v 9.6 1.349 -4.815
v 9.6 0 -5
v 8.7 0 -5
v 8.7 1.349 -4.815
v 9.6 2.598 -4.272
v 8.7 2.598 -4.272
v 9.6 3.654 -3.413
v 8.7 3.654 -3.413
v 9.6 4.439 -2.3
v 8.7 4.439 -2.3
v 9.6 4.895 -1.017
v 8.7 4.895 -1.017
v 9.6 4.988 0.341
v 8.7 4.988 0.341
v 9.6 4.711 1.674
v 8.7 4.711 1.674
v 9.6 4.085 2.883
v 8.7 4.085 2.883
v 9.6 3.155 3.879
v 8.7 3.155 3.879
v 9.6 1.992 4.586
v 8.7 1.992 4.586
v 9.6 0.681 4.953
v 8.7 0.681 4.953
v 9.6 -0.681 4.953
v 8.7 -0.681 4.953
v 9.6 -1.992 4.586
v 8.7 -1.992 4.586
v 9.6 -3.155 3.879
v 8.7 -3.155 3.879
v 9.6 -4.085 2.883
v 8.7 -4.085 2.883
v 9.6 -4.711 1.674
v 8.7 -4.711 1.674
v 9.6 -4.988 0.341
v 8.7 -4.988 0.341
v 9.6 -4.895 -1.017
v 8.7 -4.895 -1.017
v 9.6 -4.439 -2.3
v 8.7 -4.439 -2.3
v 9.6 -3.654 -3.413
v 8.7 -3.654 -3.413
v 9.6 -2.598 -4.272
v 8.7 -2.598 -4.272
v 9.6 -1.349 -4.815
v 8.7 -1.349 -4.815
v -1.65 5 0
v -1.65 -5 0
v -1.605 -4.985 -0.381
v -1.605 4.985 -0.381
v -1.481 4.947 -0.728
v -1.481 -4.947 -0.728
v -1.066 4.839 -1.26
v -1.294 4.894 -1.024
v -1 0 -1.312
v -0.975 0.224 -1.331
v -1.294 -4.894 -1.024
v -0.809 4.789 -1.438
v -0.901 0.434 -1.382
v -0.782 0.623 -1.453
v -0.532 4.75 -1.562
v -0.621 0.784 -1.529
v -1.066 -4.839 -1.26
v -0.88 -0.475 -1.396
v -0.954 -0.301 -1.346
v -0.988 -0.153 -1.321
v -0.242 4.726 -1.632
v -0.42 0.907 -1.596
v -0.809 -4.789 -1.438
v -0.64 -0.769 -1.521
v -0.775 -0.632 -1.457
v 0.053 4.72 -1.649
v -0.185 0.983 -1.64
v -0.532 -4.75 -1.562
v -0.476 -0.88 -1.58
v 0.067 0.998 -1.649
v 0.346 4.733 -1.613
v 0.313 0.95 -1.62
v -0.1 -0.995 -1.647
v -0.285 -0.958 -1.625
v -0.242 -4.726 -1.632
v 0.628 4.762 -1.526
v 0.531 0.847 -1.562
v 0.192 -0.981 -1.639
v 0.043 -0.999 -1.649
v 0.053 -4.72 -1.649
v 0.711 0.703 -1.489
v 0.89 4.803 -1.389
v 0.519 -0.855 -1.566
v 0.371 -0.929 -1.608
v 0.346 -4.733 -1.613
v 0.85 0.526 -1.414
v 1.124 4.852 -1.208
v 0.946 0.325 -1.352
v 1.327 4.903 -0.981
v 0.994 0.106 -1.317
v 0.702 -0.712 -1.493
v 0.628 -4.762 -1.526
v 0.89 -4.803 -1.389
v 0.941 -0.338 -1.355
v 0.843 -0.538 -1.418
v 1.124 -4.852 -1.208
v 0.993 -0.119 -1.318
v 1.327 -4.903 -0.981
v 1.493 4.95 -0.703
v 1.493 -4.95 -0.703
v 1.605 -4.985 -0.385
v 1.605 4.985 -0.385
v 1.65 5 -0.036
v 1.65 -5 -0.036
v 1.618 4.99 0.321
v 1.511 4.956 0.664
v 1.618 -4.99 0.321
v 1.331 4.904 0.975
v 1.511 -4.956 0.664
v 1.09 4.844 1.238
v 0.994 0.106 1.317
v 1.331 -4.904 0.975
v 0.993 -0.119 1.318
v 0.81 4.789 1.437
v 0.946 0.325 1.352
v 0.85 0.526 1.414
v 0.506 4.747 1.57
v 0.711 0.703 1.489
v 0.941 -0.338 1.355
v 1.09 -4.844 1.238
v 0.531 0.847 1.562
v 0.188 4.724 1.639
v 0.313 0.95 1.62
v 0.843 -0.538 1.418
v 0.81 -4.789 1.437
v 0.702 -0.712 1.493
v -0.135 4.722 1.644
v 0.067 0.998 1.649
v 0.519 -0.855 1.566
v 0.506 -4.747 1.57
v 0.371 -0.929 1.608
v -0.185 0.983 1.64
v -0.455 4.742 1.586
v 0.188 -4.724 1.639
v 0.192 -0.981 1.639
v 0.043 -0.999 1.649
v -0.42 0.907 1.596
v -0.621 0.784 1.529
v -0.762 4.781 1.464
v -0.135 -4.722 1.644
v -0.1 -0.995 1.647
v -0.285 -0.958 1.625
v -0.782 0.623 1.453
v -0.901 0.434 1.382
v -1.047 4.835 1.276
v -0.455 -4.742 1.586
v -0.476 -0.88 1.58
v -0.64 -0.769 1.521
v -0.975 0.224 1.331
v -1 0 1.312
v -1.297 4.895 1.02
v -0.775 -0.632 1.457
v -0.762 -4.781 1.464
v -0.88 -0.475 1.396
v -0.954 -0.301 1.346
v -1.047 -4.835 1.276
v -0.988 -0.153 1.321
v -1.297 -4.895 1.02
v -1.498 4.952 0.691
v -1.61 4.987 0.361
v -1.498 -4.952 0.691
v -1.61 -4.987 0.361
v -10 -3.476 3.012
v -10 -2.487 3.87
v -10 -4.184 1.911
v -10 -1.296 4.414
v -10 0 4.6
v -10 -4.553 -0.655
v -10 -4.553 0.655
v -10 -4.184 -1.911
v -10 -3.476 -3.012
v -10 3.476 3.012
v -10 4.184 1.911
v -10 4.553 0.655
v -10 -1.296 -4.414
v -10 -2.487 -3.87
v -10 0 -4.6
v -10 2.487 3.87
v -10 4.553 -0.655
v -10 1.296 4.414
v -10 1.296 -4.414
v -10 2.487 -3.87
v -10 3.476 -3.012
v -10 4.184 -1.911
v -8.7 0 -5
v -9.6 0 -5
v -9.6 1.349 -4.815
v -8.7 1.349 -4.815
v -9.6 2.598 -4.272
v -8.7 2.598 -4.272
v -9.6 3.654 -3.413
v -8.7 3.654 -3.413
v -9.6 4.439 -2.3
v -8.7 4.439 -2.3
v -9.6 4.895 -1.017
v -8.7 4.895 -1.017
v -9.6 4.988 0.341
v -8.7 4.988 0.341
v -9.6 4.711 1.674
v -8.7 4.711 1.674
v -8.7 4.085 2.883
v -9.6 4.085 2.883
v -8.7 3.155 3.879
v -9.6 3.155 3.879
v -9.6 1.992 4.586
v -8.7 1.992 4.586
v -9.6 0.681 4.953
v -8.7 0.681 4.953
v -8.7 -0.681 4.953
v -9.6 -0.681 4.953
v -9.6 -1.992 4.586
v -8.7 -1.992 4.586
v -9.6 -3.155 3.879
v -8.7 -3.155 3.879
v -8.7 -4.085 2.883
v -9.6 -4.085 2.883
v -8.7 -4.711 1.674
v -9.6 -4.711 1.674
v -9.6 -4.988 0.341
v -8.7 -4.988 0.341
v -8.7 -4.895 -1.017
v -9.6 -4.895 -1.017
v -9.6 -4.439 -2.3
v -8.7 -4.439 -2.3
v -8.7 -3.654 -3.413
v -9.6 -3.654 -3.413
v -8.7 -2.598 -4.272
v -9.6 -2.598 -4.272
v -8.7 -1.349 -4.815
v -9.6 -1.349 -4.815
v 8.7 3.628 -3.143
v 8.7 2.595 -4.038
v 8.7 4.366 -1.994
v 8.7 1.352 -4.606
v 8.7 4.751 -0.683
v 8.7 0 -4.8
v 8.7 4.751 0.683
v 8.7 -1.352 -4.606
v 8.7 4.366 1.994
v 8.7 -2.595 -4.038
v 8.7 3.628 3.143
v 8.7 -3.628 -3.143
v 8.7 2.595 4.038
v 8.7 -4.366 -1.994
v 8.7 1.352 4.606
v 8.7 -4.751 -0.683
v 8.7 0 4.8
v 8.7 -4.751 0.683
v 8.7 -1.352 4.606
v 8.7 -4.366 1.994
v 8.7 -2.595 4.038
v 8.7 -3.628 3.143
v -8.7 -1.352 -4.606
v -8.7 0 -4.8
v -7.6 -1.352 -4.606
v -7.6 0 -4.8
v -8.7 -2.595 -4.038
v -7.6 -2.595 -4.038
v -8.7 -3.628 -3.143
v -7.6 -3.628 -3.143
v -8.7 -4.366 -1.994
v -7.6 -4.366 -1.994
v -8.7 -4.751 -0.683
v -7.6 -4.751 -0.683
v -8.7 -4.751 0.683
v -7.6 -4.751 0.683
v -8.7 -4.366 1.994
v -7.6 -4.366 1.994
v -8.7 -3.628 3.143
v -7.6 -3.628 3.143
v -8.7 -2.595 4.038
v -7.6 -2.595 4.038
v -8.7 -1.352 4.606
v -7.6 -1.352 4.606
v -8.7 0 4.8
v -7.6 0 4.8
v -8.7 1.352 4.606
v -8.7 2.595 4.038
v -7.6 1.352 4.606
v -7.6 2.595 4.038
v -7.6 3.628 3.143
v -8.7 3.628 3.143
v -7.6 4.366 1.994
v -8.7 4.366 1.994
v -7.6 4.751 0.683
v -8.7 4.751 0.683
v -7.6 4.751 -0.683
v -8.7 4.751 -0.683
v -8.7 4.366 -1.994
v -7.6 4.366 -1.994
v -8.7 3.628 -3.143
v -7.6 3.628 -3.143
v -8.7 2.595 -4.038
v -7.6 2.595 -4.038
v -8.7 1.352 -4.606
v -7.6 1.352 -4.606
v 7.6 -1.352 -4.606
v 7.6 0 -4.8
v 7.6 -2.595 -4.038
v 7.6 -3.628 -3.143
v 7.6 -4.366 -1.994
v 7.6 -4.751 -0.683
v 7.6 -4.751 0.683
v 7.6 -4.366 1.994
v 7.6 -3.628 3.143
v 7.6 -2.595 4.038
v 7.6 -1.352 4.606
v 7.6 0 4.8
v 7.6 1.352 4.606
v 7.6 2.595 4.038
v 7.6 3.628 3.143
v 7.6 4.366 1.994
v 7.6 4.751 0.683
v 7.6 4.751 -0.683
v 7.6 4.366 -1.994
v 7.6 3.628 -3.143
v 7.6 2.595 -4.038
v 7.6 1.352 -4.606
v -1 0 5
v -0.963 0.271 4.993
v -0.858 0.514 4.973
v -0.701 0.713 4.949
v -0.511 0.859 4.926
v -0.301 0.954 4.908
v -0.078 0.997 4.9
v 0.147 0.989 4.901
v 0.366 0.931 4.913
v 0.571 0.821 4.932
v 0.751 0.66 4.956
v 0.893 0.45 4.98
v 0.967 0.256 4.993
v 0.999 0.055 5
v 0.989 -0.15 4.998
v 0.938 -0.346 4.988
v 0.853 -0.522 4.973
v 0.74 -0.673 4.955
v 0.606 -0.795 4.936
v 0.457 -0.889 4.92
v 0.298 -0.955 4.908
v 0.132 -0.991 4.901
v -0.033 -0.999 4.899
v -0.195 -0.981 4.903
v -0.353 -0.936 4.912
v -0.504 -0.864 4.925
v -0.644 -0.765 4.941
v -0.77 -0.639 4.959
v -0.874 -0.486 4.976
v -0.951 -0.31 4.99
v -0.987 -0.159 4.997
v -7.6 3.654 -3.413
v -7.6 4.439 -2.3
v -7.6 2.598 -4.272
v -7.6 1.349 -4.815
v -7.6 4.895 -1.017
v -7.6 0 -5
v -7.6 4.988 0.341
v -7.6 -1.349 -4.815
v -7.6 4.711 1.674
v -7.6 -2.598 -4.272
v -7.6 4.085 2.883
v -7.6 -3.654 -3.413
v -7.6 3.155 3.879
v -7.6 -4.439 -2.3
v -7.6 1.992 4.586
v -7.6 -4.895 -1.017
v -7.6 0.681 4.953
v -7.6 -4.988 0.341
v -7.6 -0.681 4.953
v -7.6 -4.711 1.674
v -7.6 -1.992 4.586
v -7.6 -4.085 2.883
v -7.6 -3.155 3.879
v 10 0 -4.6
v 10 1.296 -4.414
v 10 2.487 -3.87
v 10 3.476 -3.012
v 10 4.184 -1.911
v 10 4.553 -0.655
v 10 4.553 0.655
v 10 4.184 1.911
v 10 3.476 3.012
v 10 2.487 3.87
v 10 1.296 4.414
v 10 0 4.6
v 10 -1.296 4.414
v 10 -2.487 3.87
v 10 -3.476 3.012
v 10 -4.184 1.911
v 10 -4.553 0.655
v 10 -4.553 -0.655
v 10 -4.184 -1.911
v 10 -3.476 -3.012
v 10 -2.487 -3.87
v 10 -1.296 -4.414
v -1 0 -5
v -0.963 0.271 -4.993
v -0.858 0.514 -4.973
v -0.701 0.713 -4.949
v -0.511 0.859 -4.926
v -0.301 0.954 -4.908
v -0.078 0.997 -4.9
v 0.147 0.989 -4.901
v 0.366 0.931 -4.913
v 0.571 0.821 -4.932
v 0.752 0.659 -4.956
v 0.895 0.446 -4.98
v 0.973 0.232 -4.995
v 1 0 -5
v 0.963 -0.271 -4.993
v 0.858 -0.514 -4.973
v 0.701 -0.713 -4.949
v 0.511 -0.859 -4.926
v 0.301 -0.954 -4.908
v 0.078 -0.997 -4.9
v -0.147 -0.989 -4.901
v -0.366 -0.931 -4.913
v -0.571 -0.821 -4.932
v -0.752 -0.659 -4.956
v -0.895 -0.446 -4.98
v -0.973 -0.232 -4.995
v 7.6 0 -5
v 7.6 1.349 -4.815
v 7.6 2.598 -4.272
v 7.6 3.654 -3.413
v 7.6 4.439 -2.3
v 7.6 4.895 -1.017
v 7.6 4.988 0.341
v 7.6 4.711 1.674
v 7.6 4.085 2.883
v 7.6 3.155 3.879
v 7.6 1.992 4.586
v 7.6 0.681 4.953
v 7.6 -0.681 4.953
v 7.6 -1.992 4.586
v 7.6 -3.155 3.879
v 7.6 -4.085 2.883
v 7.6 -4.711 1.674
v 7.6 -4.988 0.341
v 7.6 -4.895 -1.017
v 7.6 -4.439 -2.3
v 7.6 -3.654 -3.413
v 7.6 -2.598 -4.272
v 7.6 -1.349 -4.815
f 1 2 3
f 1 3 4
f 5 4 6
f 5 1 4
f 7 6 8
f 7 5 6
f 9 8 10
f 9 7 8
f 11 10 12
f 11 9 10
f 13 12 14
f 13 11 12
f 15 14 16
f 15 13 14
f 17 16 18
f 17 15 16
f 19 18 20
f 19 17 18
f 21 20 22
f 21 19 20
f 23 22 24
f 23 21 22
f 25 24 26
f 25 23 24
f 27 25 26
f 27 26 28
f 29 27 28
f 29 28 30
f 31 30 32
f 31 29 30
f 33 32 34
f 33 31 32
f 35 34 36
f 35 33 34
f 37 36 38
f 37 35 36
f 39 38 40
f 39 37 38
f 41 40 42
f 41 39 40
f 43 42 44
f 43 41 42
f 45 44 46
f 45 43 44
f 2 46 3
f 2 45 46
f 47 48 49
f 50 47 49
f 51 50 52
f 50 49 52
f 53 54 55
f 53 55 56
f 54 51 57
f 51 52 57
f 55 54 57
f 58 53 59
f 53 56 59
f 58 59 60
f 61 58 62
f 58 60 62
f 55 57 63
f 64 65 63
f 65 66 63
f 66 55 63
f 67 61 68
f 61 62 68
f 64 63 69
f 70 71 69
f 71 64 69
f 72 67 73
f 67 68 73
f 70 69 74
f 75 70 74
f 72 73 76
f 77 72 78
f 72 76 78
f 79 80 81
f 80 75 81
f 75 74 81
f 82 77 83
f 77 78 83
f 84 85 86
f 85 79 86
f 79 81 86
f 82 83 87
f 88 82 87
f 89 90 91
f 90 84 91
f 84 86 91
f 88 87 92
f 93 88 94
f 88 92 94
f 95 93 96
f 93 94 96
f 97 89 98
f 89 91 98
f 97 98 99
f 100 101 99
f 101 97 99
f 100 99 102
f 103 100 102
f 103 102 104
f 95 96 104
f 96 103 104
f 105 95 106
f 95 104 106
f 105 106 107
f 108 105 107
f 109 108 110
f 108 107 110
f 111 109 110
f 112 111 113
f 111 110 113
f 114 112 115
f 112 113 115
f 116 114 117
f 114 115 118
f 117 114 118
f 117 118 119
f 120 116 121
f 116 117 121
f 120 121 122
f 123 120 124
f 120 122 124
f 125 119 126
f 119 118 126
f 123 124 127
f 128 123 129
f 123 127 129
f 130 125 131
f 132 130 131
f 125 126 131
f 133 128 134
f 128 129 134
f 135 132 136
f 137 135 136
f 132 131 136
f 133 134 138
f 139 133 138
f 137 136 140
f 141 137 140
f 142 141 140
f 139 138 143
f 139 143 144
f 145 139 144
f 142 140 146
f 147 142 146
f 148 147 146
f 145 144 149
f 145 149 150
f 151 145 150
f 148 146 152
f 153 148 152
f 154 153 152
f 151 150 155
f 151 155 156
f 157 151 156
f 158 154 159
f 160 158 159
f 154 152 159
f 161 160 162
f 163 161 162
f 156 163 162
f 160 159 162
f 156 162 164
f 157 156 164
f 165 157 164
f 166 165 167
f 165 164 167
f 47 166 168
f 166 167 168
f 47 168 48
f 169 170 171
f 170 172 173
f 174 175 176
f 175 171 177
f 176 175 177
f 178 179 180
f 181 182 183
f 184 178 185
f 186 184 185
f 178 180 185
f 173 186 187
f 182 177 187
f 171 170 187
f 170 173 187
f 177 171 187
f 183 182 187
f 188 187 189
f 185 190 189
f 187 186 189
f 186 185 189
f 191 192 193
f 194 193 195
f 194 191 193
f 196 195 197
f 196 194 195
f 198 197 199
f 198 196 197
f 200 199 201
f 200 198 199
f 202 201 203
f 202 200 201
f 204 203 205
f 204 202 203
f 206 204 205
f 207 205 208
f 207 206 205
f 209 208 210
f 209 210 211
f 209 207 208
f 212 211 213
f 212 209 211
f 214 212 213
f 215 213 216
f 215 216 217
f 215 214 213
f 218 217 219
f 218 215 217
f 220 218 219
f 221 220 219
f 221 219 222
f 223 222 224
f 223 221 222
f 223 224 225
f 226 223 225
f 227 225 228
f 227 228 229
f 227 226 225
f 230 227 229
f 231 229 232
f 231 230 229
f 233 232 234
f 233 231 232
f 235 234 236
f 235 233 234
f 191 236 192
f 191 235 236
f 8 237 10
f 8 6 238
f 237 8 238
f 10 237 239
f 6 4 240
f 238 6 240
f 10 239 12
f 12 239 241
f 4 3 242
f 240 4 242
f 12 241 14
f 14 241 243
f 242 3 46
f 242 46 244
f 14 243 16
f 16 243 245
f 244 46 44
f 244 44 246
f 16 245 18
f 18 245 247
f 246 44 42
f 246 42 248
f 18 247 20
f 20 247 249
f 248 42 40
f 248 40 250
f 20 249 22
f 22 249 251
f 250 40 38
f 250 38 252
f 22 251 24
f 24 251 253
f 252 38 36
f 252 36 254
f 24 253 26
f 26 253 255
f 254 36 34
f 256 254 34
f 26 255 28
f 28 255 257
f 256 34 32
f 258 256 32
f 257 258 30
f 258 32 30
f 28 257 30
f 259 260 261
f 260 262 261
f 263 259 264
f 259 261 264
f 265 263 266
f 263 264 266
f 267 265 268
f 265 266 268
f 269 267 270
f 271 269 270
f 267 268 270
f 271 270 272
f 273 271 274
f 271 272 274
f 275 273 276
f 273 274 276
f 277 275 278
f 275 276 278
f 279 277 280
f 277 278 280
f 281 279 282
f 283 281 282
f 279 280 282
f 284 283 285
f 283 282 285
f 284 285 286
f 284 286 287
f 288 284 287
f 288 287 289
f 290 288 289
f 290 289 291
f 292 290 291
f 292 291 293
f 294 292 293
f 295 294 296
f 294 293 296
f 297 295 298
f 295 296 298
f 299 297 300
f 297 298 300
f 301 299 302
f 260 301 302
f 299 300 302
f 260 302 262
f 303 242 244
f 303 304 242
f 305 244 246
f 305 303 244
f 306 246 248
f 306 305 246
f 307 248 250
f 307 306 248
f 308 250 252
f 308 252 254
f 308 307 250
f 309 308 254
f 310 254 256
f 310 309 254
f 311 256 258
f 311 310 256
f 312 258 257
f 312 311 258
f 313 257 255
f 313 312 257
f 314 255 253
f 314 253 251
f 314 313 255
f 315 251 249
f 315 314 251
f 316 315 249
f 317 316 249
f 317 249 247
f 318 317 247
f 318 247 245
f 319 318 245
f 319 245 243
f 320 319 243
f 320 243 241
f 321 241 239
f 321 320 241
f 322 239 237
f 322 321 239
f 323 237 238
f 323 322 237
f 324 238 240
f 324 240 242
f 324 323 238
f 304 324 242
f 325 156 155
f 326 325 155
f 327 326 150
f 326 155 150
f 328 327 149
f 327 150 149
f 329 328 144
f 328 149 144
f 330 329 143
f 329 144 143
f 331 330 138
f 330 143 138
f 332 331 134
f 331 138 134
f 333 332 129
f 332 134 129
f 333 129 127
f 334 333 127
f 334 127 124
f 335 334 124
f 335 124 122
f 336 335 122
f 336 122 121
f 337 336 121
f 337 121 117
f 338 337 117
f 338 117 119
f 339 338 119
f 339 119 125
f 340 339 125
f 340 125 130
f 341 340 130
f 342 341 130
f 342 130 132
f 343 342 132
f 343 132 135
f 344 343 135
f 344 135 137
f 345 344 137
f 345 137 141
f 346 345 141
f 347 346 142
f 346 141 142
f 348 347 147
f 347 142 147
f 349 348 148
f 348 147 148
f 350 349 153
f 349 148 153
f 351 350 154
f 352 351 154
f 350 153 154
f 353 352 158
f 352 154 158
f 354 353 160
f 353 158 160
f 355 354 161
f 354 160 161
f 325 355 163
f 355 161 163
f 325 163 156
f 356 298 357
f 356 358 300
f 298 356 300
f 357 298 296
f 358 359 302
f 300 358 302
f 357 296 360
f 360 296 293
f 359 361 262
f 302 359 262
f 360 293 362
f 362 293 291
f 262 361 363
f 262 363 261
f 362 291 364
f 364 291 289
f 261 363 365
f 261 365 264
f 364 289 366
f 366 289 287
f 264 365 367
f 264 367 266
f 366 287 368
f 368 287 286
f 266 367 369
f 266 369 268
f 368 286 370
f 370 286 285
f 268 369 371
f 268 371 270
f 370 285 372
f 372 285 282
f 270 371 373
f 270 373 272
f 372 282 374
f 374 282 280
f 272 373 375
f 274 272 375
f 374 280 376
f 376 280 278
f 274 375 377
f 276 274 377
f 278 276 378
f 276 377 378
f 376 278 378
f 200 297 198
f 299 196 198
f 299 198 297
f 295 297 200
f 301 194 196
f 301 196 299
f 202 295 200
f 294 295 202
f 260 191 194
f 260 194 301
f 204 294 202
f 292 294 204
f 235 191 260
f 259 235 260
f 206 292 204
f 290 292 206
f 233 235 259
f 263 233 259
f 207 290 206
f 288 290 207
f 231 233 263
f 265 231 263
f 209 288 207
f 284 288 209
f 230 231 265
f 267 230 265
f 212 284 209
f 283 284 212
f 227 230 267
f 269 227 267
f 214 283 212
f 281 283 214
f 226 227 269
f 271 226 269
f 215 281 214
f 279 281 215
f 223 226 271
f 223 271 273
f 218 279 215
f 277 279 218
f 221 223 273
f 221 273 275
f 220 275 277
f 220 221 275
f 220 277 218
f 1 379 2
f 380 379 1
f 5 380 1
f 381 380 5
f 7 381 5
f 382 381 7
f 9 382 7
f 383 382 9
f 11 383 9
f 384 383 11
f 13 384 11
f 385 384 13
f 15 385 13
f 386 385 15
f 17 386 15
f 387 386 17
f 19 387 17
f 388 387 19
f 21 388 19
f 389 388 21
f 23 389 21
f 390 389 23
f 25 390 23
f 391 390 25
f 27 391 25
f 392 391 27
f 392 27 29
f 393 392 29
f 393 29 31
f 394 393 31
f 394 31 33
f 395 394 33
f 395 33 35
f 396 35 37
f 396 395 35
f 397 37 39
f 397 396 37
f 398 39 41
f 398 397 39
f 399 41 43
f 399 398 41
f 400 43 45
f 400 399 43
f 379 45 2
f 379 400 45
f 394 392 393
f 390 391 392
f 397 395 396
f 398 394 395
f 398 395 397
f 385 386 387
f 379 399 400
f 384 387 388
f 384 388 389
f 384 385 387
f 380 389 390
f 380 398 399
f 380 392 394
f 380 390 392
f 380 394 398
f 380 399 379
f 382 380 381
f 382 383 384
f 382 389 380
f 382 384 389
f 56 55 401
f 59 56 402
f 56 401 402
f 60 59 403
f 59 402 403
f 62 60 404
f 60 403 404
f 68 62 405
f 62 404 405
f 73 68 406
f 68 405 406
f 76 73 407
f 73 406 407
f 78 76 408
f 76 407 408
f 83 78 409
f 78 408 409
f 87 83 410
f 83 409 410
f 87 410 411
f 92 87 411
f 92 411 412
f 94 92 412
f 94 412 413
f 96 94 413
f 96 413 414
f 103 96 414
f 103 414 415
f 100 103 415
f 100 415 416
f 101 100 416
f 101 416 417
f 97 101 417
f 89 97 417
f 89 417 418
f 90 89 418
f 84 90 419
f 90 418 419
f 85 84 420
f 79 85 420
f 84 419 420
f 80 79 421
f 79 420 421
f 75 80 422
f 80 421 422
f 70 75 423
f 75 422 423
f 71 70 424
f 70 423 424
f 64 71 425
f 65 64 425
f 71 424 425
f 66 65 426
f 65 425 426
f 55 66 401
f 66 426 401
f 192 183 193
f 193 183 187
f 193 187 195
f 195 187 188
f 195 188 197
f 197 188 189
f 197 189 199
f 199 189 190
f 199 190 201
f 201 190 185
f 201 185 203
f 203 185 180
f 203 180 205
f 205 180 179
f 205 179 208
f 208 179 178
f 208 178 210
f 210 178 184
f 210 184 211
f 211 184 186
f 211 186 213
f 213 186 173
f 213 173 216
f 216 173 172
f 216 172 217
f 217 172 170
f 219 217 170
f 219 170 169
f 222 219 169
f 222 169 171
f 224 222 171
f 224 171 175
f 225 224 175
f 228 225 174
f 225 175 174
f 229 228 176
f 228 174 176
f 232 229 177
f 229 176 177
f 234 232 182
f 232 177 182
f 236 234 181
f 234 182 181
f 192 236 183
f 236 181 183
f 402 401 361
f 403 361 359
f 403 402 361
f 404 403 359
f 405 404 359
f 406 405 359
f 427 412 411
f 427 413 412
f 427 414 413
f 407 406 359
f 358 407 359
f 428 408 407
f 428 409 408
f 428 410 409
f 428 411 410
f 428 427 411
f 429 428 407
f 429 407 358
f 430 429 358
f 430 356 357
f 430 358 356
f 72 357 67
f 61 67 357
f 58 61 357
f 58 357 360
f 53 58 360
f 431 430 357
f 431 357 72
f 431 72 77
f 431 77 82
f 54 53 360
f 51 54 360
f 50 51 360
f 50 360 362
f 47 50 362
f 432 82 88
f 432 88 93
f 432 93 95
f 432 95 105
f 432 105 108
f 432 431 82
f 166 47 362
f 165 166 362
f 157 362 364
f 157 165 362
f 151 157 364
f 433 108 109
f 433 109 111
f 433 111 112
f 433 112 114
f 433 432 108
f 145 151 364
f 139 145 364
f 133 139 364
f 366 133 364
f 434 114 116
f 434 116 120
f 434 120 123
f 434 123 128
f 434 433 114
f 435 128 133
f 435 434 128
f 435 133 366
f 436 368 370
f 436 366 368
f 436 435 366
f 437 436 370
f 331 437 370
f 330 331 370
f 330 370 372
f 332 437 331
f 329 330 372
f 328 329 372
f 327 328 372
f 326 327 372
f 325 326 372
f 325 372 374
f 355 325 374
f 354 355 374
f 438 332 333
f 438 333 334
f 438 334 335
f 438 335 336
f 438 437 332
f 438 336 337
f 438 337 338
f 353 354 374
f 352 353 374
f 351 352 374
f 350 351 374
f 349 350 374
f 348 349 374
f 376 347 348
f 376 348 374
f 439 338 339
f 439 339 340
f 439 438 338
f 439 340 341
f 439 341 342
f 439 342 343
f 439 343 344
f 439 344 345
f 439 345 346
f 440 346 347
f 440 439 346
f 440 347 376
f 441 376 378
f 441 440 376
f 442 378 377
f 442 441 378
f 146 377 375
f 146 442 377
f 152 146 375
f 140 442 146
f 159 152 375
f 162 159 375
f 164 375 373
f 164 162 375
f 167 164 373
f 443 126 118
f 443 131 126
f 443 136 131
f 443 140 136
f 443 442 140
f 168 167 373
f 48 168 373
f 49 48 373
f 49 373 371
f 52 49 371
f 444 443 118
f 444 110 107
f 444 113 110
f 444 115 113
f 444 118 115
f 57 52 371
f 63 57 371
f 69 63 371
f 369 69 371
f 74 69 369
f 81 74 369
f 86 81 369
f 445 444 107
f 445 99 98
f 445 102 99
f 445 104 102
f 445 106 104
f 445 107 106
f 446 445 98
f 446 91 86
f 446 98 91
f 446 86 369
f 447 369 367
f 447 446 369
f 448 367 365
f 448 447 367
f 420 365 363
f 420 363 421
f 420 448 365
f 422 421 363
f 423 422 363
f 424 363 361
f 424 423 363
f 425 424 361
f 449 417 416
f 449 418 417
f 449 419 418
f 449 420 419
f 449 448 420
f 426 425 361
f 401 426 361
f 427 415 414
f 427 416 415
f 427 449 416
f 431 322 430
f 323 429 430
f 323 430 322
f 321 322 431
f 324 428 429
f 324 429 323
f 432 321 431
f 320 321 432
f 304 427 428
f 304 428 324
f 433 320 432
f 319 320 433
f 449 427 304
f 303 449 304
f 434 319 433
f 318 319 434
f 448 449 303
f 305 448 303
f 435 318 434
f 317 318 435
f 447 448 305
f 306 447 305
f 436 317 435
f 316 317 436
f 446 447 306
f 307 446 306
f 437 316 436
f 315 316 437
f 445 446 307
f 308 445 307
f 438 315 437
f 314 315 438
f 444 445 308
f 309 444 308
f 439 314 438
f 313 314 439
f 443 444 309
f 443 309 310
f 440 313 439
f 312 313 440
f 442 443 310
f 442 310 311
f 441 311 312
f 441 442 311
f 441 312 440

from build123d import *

# Parameters (mm, degrees)
SKETCH1_R           = 5
BOSS_EXTRUDE1_DEPTH = 10
SKETCH2_W           = 1.1
SKETCH2_H           = 0.2
CHAMFER1_SIZE       = 0.4
M4_TAPPED_HOLE4_D   = 3.3
SKETCH6_R           = 1
CUT_EXTRUDE1_DEPTH  = 16.0000001


with BuildPart() as part:
    # Sketch1 → Boss-Extrude1 (new, symmetric)
    with BuildSketch(Plane(origin=(0, 0, 0), x_dir=(0, 0, -1), z_dir=(1, 0, 0))):
        Circle(SKETCH1_R)
    extrude(amount=BOSS_EXTRUDE1_DEPTH, both=True)

    # Sketch2 → Cut-Revolve1 (revolve, cut)
    with BuildSketch(Plane(origin=(0, 0, 0), x_dir=(1, 0, 0), z_dir=(0, 1, 0))):
        with Locations((-8.15, 4.9)):
            Rectangle(SKETCH2_W, SKETCH2_H)
    cut_revolve1 = revolve(axis=Axis((0, 0, 0), (-1, 0, 0)), mode=Mode.SUBTRACT)

    # Mirror1: Cut-Revolve1 across plane
    add(cut_revolve1.mirror(Plane(origin=(0, 0, 0), x_dir=(0, 0, 1), z_dir=(1, 0, 0))), mode=Mode.SUBTRACT)

    # Chamfer1
    chamfer1_edges = [part.edges().sort_by_distance(p)[0] for p in [
        (-10, 0, 5),
        (10, 0, 5),
    ]]
    chamfer(chamfer1_edges, length=CHAMFER1_SIZE)

    # M4 Tapped Hole4 (through all)
    with Locations(Plane(origin=(0, 5, 0), x_dir=(1, 0, 0), z_dir=(0, 1, 0))):
        with Locations((0, 0)):
            Hole(M4_TAPPED_HOLE4_D / 2)

    # Sketch6 → Cut-Extrude1 (cut, through all)
    with BuildSketch(Plane(origin=(0, 0, -5), x_dir=(-1, 0, 0), z_dir=(0, 0, -1))):
        Circle(SKETCH6_R)
    extrude(amount=-CUT_EXTRUDE1_DEPTH, mode=Mode.SUBTRACT)


solid = part.part
